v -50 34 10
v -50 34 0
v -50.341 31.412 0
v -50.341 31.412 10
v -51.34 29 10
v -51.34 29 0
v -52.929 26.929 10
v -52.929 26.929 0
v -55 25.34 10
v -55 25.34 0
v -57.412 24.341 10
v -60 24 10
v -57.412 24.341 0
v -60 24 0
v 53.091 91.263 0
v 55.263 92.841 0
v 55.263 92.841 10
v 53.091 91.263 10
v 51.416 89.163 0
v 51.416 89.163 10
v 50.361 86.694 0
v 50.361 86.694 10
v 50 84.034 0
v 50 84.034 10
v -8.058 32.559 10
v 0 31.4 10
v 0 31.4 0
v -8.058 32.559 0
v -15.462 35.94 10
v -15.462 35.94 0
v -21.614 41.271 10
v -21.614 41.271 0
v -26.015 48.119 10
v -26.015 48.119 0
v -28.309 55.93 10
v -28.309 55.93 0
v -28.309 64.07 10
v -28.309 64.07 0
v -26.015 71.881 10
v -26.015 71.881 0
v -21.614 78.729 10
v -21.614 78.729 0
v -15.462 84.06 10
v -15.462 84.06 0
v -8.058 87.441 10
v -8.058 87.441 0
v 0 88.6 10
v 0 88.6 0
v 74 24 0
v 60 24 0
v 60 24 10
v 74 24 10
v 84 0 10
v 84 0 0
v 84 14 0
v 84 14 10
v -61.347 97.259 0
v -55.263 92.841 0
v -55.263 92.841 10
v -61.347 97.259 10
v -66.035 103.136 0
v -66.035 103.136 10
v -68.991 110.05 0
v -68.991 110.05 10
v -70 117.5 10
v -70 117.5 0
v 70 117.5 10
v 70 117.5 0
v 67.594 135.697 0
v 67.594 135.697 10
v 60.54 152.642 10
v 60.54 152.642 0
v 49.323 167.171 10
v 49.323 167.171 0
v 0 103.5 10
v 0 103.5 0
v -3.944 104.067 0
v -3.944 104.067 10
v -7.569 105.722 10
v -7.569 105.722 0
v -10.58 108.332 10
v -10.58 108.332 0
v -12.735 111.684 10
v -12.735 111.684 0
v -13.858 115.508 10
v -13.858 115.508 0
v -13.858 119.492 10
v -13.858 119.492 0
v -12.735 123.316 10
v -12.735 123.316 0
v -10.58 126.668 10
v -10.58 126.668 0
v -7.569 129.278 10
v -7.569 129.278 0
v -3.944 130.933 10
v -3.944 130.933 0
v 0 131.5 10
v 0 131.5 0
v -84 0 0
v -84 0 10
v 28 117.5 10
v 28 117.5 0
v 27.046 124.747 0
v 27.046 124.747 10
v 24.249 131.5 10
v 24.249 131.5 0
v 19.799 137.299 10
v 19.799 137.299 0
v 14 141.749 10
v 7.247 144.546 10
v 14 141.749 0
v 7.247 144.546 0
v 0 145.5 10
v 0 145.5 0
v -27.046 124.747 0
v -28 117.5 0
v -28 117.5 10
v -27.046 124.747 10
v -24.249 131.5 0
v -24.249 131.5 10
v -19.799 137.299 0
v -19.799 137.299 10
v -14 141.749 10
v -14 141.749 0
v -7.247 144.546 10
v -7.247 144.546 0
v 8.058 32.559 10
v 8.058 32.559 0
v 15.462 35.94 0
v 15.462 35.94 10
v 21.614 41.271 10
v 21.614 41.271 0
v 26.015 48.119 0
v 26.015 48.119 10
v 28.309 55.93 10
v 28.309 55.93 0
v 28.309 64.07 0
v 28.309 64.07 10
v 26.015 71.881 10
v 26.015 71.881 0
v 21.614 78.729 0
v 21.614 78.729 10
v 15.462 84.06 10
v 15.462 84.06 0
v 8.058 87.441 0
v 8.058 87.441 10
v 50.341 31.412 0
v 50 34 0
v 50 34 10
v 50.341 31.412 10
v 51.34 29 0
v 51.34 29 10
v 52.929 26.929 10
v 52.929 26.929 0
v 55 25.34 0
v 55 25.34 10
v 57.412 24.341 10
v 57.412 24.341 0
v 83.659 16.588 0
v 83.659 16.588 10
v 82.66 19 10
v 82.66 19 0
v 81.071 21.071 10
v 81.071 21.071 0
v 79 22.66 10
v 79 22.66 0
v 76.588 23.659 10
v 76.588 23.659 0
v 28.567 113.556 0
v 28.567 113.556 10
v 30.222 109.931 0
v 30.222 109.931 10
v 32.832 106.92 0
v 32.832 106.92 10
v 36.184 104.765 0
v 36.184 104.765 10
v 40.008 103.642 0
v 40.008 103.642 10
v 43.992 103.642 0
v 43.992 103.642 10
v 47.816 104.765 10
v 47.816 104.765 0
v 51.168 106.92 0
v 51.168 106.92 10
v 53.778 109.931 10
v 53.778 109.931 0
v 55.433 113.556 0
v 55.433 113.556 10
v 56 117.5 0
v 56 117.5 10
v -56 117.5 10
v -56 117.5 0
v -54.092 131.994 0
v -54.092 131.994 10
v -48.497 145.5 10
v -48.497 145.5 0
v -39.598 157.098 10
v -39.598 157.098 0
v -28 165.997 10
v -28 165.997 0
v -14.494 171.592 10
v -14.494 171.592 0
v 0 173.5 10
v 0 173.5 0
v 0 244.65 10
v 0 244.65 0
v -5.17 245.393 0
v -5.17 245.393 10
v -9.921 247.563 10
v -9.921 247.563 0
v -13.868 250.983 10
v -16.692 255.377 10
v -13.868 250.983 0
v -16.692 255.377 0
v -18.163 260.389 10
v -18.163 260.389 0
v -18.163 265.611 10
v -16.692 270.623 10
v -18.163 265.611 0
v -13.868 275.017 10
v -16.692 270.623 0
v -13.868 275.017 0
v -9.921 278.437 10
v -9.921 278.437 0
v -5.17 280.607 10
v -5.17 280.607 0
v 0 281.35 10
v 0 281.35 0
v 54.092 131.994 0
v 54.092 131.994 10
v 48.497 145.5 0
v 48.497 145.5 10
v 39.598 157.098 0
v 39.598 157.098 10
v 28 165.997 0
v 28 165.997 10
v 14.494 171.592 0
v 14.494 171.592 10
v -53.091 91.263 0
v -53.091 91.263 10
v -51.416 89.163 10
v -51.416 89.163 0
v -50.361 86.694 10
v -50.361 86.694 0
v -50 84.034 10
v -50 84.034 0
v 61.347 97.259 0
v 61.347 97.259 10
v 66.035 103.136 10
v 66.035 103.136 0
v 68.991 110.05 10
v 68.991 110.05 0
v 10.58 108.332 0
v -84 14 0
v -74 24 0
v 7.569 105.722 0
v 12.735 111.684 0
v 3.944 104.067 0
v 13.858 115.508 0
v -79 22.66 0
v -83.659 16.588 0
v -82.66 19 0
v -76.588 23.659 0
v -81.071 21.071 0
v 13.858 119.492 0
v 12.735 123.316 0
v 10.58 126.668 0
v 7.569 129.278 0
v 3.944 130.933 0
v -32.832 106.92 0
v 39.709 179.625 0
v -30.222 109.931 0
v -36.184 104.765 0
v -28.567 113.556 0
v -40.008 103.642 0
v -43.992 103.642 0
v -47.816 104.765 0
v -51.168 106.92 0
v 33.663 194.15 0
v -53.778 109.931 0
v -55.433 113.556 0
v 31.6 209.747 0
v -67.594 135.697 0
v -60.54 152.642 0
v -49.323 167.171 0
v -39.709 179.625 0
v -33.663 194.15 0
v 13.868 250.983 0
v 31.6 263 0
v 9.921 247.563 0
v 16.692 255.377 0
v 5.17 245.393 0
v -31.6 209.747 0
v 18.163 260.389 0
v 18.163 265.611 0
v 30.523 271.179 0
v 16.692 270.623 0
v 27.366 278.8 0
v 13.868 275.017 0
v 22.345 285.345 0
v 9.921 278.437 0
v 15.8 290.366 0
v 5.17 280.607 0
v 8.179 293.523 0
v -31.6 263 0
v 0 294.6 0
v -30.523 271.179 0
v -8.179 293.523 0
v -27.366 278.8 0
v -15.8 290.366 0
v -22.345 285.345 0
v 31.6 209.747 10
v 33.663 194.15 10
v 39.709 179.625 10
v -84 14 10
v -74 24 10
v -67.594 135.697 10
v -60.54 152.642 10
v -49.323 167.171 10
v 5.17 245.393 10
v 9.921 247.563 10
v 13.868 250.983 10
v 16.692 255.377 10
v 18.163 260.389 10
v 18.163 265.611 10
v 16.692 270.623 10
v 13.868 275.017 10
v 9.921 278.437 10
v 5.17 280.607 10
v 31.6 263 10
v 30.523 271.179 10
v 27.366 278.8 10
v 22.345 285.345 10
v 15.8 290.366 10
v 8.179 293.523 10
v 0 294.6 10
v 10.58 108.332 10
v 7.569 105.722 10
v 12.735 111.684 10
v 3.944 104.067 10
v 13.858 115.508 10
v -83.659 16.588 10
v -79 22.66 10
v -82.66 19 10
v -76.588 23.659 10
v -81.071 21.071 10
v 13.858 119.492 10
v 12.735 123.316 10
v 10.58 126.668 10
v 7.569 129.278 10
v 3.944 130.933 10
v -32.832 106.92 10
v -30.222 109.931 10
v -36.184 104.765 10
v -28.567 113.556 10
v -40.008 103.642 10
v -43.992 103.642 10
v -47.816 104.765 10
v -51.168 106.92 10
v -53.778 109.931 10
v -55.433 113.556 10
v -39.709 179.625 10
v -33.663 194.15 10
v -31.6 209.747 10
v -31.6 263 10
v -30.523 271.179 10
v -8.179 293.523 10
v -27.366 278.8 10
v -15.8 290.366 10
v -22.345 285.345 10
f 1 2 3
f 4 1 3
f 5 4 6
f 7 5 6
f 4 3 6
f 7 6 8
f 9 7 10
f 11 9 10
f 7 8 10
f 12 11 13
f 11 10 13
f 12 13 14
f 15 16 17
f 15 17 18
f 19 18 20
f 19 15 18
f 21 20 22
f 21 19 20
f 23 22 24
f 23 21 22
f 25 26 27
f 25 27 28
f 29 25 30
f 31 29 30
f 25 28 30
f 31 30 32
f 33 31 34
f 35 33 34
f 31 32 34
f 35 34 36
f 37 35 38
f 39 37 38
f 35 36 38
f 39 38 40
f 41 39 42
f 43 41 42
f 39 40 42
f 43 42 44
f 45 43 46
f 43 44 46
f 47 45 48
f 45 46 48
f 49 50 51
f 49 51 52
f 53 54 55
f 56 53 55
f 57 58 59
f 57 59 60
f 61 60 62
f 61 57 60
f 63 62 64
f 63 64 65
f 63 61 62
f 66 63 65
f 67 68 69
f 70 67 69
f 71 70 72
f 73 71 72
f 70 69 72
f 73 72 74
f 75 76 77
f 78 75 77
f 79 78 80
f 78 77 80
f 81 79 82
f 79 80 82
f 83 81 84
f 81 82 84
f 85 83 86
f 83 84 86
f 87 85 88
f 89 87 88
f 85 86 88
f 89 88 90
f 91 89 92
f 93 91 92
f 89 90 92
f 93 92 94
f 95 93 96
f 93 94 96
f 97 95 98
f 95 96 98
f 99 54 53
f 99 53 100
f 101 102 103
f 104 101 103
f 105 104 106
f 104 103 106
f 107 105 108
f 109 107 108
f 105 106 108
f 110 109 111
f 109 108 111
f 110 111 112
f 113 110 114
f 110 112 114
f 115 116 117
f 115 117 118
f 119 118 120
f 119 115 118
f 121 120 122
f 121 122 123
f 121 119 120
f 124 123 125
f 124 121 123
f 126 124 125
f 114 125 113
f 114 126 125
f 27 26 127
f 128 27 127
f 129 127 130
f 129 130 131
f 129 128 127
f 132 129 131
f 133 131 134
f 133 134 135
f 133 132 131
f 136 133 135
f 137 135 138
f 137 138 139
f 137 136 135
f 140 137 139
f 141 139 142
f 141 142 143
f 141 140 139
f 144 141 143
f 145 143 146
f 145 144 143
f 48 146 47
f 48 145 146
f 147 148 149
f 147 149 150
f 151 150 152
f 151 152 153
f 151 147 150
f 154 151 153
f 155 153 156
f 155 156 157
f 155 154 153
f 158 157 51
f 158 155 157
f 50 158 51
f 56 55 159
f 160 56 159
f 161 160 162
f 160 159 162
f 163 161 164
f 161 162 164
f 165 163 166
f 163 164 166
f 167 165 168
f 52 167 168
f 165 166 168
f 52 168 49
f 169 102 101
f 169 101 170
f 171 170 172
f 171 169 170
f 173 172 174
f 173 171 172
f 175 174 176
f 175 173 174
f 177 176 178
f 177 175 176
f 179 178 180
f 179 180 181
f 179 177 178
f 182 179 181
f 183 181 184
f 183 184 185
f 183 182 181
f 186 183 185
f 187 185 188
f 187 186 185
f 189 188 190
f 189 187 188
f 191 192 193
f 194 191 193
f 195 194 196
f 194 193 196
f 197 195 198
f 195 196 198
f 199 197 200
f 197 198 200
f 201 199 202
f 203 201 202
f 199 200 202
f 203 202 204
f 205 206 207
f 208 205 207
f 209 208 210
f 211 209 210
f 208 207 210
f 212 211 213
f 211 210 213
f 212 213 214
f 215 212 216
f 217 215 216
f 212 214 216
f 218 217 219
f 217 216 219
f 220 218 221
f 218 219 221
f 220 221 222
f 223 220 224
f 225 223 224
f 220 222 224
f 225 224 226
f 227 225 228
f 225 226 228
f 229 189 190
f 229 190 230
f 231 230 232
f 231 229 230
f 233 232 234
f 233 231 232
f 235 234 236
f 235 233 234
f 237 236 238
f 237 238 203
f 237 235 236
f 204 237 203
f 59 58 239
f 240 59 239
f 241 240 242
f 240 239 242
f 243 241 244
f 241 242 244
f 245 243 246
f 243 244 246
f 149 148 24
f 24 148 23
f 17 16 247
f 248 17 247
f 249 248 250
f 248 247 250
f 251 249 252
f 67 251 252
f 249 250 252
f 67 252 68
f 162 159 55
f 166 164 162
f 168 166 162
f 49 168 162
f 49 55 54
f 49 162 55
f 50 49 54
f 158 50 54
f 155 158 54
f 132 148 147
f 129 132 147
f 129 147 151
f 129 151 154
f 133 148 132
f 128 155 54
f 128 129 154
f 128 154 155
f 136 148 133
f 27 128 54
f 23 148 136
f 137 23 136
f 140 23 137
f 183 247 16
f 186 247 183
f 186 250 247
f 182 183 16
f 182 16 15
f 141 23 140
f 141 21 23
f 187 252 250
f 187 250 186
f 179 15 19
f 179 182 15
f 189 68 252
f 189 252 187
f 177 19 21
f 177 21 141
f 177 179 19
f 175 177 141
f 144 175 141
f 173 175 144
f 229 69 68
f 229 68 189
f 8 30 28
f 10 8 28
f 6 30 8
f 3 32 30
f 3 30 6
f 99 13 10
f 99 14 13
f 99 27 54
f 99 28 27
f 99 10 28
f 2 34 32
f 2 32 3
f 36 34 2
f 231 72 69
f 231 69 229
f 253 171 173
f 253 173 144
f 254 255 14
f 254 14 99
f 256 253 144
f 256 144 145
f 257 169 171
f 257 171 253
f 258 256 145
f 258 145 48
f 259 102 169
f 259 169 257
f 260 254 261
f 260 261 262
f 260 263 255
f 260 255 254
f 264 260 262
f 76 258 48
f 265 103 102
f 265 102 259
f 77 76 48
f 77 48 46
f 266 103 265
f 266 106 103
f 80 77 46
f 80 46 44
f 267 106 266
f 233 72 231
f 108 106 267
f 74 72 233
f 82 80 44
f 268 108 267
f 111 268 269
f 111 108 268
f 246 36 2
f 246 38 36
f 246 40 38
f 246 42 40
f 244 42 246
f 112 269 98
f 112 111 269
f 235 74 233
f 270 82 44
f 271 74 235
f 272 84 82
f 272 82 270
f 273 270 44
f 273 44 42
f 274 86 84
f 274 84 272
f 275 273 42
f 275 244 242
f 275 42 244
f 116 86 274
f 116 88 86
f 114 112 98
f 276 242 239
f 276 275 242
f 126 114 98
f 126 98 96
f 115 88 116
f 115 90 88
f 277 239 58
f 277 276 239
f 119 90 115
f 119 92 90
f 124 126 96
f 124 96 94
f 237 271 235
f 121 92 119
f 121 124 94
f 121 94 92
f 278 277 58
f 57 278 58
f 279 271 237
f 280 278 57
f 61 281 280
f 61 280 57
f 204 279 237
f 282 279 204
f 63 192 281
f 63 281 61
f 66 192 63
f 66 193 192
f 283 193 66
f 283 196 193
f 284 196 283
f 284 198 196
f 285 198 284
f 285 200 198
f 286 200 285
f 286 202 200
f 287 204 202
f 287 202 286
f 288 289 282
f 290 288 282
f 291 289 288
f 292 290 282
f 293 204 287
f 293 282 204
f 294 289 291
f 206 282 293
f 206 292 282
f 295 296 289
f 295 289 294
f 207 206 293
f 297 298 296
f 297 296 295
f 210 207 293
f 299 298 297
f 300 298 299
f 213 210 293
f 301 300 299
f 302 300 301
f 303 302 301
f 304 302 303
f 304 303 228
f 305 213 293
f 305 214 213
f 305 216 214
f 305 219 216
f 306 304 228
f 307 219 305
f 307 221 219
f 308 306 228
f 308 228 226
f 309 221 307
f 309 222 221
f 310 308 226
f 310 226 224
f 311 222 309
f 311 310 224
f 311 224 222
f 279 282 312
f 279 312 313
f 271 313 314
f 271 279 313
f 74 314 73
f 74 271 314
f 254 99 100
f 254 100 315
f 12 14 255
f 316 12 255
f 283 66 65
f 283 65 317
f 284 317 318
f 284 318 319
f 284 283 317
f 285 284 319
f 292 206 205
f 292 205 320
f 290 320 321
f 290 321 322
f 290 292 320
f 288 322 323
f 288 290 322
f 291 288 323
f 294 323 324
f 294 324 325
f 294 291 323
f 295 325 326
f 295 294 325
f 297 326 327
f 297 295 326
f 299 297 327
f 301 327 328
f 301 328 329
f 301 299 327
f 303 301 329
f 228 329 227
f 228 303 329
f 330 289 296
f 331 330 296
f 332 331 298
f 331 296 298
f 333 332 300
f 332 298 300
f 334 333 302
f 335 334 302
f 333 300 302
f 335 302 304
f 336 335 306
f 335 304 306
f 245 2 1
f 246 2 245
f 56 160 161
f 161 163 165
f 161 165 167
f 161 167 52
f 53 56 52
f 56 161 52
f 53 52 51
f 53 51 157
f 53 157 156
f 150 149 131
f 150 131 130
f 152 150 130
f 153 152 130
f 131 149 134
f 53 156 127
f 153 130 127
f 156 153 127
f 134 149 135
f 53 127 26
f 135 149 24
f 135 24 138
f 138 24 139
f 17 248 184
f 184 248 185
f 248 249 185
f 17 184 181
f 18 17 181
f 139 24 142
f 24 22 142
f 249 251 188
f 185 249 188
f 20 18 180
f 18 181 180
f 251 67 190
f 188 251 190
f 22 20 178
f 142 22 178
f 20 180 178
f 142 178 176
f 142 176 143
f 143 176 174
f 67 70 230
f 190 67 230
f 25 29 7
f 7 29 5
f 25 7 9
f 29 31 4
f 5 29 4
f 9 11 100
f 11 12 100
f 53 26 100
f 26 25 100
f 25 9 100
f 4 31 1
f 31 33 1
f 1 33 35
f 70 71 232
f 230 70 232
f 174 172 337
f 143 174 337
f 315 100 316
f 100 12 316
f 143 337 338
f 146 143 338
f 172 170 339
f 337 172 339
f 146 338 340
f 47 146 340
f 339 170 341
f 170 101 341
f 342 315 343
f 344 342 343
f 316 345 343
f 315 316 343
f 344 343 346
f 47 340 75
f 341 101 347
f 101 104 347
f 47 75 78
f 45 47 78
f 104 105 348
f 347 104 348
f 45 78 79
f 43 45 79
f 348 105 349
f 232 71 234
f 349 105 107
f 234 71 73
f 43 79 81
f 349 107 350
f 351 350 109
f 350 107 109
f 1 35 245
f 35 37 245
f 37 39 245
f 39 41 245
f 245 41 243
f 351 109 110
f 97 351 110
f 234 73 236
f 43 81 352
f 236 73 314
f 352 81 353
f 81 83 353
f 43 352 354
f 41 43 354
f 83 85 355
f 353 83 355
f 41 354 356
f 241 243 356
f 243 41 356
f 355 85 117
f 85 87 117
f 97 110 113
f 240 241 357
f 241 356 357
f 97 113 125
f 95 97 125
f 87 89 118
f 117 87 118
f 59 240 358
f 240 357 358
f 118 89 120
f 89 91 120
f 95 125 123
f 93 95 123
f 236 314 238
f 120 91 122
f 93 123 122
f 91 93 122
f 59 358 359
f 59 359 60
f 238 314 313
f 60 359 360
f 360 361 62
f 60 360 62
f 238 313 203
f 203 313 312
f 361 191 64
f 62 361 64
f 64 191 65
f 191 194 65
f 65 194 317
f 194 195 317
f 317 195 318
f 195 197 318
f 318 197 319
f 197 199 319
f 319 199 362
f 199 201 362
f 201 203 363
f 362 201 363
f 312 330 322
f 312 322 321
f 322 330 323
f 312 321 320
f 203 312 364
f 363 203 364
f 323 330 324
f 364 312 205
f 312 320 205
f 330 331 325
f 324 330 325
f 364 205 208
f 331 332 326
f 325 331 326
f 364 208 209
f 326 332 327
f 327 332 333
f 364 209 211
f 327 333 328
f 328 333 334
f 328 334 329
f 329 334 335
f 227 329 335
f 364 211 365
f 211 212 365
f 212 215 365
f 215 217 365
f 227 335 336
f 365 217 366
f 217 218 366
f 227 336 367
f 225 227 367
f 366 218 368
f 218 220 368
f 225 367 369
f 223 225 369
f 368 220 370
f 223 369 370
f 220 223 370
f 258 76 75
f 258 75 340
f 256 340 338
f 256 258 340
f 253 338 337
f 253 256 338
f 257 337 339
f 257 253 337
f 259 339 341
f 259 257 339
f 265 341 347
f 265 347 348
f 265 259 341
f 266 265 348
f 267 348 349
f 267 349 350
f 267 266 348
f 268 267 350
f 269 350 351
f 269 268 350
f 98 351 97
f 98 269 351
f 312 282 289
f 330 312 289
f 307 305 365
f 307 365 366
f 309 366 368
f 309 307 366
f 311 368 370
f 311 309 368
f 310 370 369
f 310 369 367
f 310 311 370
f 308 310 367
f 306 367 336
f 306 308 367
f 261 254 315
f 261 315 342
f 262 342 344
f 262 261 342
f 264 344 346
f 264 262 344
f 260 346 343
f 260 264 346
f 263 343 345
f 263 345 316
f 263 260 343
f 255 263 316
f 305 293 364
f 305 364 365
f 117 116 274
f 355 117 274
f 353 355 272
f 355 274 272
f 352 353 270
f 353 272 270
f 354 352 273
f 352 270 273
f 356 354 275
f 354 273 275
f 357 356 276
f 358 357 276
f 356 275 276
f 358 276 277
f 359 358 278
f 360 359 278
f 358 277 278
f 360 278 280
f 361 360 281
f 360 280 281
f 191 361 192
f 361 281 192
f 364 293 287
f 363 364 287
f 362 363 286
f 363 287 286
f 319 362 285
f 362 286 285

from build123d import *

# Parameters (mm, degrees)
PAD_DEPTH = 10


with BuildPart() as part:
    # Sketch → Pad (new body)
    with BuildSketch(Plane.XY):
        with BuildLine():
            Line((0, 0), (84, 0))
            Line((84, 0), (84, 14))
            ThreePointArc((84, 14), (81.071068, 21.071068), (74, 24))
            Line((60, 24), (74, 24))
            ThreePointArc((50, 34), (52.928932, 26.928932), (60, 24))
            Line((50, 34), (50, 84.033599))
            ThreePointArc((55.263158, 92.840547), (51.416049, 89.163491), (50, 84.033599))
            ThreePointArc((55.263158, 92.840547), (66.035062, 103.136303), (70, 117.5))
            ThreePointArc((70, 117.5), (64.624358, 144.40153), (49.323077, 167.17126))
            ThreePointArc((31.6, 209.746626), (36.207693, 186.688172), (49.323077, 167.17126))
            Line((31.6, 209.746626), (31.6, 263))
            ThreePointArc((31.6, 263), (22.344574, 285.344574), (0, 294.6))
            Line((0, 294.6), (0, 281.35))
            ThreePointArc((0, 244.65), (18.35, 263), (0, 281.35))
            Line((0, 244.65), (0, 173.5))
            ThreePointArc((56, 117.5), (39.59798, 157.09798), (0, 173.5))
            ThreePointArc((28, 117.5), (42, 103.5), (56, 117.5))
            ThreePointArc((28, 117.5), (19.79899, 137.29899), (0, 145.5))
            Line((0, 145.5), (0, 131.5))
            ThreePointArc((0, 103.5), (14, 117.5), (0, 131.5))
            Line((0, 103.5), (0, 88.6))
            ThreePointArc((0, 31.4), (28.6, 60), (0, 88.6))
            Line((0, 31.4), (0, 0))
        make_face()
    pad = extrude(amount=PAD_DEPTH)

    # Mirrored: Pad across Sketch V_Axis
    add(pad.mirror(Plane(origin=(0, 0, 0), x_dir=(0, 0, 1), z_dir=(1, 0, 0))))


solid = part.part
